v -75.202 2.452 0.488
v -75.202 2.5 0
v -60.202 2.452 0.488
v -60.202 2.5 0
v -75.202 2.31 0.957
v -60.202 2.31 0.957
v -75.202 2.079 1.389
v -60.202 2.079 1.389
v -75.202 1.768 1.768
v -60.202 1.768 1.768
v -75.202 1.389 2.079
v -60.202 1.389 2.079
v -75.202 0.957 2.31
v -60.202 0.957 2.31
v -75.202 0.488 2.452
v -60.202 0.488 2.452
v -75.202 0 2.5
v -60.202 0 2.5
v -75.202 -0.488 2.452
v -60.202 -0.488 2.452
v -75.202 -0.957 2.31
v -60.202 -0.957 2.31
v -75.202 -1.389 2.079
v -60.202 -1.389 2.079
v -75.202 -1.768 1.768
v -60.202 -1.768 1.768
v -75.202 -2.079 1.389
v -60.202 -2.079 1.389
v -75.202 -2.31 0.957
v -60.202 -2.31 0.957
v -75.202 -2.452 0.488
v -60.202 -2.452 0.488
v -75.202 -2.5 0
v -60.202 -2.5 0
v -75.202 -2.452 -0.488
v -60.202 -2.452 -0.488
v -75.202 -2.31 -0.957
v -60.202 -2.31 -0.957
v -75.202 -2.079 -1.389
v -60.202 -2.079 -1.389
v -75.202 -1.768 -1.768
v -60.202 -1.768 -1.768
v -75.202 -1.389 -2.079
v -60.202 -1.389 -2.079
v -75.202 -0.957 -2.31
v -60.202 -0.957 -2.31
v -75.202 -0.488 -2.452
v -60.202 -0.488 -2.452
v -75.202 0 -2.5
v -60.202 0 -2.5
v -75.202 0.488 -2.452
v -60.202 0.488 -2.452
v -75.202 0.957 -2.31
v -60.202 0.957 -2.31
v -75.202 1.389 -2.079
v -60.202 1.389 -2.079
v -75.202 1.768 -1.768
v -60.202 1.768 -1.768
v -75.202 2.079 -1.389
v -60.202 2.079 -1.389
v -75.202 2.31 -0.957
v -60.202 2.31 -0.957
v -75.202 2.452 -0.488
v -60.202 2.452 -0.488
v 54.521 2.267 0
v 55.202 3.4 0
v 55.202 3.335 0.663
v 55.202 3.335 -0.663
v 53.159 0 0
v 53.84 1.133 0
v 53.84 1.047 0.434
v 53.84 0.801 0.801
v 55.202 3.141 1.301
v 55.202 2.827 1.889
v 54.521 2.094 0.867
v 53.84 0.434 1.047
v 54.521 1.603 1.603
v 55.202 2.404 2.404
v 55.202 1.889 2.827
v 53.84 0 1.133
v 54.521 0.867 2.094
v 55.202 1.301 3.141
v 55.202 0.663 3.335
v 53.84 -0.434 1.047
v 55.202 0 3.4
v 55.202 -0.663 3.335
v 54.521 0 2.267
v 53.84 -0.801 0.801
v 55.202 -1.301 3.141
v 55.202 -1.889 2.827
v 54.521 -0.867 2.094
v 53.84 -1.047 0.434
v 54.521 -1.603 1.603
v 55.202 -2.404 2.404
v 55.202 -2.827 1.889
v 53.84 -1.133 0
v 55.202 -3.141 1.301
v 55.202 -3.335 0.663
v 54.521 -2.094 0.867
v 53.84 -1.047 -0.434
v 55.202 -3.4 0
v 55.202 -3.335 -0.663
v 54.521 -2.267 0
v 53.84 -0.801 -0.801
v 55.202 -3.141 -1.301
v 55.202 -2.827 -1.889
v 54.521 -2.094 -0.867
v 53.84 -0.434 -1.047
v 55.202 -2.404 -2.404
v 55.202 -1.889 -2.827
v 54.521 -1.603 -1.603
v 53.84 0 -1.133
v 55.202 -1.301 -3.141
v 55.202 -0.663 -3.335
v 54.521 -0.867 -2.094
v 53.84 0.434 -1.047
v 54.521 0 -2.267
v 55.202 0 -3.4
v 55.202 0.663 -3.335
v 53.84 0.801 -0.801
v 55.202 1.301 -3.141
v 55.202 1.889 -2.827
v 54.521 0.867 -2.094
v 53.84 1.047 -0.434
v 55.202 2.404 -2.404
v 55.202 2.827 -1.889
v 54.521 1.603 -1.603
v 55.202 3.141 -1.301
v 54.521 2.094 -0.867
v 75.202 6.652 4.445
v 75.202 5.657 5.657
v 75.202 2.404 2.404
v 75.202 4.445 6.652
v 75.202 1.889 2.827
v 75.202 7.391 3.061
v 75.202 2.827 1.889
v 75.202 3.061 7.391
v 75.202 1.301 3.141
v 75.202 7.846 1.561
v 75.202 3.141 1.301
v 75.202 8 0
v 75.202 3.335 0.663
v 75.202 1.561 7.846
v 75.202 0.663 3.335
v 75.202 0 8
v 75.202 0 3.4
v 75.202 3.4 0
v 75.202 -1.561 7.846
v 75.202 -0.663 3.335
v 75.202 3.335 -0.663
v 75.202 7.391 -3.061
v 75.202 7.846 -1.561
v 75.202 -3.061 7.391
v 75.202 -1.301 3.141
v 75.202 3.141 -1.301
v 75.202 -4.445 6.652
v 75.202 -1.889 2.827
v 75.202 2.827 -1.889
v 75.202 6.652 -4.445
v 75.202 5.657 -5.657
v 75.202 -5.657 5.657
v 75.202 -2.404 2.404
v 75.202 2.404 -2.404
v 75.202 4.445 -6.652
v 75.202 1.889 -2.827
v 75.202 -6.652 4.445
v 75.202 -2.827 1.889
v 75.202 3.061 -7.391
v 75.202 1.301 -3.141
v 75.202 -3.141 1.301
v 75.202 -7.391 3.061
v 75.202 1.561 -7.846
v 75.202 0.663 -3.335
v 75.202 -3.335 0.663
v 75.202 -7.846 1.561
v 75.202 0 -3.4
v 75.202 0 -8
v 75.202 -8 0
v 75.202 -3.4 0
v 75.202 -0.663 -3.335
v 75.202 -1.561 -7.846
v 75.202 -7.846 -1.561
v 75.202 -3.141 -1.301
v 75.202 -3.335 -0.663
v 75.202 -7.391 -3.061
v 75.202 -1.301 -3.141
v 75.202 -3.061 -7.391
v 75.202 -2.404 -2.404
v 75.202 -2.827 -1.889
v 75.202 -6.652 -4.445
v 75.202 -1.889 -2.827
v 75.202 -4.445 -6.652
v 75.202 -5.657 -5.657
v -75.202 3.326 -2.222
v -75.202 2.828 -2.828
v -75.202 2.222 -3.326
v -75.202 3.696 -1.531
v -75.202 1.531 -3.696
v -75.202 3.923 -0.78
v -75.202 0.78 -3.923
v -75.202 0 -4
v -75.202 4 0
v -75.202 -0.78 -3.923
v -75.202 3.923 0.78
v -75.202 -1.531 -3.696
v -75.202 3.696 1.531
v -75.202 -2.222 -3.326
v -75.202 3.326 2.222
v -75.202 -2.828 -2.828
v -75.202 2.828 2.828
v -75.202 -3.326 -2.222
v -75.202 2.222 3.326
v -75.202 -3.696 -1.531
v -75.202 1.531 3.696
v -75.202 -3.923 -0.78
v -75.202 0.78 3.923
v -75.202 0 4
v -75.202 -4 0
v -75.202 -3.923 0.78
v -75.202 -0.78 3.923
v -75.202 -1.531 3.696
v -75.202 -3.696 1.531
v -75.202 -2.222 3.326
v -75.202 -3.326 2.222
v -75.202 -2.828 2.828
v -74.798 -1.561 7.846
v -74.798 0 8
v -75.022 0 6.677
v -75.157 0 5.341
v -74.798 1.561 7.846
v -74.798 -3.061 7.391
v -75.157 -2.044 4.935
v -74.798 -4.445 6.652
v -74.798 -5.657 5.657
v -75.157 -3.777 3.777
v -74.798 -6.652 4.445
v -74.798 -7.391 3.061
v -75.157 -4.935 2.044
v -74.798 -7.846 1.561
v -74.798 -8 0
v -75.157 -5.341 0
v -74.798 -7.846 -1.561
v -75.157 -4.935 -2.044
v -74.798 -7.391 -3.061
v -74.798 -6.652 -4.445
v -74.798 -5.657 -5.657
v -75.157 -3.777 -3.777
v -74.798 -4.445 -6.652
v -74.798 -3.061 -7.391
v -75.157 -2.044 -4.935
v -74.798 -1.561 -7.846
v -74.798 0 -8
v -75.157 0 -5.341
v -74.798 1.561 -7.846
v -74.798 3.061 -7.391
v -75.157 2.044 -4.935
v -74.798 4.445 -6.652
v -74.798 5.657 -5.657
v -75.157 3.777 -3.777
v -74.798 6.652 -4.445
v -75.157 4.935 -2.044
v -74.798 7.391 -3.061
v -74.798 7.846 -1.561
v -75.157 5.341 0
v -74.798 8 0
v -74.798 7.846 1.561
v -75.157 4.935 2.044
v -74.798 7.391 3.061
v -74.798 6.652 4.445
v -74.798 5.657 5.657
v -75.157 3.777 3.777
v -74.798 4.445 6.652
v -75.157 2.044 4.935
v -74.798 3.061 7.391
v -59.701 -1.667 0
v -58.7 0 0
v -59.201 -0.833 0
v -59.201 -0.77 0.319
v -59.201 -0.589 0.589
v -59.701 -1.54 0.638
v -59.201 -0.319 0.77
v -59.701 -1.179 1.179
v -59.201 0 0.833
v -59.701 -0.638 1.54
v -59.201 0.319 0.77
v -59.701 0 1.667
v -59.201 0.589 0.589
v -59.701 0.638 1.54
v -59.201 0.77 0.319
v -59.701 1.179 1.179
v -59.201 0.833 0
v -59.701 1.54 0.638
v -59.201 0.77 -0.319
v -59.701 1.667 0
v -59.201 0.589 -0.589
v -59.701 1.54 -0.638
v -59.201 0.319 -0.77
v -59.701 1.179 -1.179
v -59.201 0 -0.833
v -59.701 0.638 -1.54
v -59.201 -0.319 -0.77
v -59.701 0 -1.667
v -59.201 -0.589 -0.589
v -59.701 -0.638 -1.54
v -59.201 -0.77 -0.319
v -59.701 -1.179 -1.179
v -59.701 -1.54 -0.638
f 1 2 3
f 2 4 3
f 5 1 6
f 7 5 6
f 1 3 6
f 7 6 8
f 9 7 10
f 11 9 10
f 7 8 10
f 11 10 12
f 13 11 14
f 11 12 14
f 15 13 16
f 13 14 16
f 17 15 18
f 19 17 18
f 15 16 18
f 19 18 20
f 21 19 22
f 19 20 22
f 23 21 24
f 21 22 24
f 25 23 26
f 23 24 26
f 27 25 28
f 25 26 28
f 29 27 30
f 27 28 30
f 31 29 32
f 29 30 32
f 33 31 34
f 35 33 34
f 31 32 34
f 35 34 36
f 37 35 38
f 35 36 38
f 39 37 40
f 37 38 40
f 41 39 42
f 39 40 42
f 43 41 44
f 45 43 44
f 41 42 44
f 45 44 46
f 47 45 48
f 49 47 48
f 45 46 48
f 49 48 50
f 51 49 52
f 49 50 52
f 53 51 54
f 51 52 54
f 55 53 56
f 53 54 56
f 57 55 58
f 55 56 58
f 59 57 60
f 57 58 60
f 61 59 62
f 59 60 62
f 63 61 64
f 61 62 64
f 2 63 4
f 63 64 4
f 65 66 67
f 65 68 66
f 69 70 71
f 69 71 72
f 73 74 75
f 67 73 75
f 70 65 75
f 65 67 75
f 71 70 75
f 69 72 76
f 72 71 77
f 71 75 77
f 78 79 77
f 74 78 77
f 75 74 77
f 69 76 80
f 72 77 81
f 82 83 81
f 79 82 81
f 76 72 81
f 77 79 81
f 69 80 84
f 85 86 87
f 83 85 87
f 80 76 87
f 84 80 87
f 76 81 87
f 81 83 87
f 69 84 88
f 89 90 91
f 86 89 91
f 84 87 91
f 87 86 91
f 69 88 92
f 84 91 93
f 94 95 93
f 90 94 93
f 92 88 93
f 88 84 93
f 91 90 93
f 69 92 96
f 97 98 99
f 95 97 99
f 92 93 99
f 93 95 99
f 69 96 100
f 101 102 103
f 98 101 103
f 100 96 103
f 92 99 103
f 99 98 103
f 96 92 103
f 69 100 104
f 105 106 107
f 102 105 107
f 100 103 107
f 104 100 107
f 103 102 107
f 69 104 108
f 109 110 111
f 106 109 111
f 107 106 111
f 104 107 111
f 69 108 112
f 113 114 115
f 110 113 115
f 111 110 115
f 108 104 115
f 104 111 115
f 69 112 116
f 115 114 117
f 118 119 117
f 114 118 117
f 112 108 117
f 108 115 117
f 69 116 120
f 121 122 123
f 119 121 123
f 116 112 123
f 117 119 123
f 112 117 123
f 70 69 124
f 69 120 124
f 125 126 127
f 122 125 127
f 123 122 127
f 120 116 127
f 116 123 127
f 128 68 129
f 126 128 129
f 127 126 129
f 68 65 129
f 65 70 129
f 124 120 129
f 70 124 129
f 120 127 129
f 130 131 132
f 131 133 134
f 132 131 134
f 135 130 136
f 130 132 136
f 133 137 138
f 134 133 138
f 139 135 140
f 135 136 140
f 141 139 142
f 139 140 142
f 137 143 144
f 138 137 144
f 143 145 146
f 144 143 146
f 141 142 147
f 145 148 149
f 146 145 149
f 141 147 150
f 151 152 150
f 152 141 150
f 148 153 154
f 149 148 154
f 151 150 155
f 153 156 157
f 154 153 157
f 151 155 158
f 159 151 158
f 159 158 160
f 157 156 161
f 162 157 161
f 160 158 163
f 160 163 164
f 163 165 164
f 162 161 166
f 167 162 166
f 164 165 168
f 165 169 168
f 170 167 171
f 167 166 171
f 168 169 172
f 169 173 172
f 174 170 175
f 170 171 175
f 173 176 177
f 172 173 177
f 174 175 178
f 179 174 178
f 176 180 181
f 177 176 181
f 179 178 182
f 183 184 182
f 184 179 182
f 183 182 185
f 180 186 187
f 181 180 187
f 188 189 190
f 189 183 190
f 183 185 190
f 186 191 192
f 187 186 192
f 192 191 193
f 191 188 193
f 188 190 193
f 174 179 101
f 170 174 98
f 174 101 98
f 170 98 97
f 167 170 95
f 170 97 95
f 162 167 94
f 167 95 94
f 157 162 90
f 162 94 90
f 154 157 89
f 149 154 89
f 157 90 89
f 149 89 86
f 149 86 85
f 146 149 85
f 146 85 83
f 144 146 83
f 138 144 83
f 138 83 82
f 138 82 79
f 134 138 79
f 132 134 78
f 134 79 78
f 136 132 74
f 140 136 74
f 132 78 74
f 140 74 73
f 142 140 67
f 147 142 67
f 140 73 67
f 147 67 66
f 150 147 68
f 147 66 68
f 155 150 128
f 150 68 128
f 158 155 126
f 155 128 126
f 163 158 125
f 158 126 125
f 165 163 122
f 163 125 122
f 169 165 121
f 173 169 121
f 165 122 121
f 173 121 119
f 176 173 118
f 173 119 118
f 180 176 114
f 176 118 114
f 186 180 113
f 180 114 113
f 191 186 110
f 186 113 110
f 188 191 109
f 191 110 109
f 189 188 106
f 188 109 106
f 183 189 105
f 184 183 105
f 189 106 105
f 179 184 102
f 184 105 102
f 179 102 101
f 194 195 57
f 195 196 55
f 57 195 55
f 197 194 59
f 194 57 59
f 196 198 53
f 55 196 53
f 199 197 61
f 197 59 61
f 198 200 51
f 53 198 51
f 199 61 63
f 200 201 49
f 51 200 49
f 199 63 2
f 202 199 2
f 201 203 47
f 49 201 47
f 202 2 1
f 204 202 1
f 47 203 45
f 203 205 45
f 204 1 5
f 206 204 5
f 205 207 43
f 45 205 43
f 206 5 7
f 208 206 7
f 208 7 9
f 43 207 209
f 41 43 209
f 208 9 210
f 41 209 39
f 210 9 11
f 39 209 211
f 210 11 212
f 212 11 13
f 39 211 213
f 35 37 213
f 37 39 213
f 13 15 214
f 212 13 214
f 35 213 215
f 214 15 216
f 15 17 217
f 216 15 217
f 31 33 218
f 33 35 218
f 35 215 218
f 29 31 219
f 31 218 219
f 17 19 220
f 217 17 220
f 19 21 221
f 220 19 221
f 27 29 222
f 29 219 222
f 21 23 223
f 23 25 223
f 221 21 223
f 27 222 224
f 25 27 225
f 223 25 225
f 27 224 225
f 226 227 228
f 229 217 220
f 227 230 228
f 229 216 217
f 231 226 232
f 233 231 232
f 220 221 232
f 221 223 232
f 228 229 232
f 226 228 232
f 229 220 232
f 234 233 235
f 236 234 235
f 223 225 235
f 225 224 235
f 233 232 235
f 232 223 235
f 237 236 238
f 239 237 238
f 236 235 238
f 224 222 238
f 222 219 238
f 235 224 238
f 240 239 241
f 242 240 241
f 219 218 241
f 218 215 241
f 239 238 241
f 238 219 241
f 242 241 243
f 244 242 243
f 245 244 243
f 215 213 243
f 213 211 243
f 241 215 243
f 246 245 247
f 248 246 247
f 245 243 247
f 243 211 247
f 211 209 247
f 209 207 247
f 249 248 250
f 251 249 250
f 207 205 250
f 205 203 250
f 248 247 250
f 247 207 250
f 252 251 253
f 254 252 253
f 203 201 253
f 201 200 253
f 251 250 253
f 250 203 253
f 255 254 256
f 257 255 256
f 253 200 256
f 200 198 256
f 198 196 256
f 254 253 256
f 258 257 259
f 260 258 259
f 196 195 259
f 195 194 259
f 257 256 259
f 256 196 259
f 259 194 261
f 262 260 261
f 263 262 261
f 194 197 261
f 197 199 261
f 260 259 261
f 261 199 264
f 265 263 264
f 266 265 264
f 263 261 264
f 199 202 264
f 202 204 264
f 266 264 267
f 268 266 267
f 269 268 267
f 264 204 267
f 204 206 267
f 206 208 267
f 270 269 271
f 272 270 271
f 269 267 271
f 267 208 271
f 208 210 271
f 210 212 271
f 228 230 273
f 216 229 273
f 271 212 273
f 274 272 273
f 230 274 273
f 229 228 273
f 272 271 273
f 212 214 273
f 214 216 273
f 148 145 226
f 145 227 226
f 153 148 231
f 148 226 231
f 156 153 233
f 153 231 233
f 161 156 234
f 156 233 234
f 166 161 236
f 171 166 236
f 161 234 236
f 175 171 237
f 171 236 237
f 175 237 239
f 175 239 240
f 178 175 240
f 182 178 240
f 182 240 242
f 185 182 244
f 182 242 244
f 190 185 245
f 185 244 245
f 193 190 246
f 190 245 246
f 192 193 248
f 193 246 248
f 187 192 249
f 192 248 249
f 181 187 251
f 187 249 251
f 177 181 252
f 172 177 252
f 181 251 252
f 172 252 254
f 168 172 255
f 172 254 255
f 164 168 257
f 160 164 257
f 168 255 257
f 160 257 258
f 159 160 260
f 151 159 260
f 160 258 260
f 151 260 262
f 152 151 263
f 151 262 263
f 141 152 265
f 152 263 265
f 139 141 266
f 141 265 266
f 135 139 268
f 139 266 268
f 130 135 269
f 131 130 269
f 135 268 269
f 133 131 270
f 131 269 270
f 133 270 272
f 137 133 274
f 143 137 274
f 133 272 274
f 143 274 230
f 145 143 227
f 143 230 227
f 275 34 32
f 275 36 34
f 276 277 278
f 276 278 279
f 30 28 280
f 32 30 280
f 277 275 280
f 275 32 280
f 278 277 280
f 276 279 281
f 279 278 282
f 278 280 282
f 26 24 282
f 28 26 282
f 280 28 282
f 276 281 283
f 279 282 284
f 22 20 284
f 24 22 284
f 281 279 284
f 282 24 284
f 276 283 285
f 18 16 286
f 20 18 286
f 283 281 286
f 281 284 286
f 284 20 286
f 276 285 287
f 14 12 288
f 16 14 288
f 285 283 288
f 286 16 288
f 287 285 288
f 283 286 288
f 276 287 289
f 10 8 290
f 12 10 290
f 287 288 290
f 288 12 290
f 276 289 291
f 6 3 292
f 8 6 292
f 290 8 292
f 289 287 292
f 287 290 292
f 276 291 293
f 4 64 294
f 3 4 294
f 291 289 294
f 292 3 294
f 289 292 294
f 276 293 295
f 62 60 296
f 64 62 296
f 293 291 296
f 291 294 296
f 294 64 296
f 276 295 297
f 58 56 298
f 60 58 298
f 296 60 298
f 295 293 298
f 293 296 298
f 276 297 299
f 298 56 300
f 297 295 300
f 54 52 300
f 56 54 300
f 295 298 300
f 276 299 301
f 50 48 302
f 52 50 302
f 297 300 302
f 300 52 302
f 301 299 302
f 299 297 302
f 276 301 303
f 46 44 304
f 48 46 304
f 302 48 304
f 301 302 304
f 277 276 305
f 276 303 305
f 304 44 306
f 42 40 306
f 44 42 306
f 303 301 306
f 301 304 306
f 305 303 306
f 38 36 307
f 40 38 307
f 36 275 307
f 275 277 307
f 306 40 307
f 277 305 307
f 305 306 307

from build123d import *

# Parameters (mm, degrees)
F3_D     = 5
F3_DEPTH = 15
F3_TIP   = 1.5021515476
F5_D     = 6.8
F5_DEPTH = 20
F5_TIP   = 2.0429261047


with BuildPart() as f1:
    # F0 (on Front) → F1 (revolve)
    with BuildSketch(Plane.XZ):
        with BuildLine():
            Line((-75.2020410289, 0), (75.2020410289, 0))
            Line((75.2020410289, 0), (75.2020410289, 8))
            Line((75.2020410289, 8), (-74.7979589711, 8))
            ThreePointArc((-74.7979589711, 8), (-75.100764089, 6.0101792401), (-75.2020410289, 4))
            Line((-75.2020410289, 4), (-75.2020410289, 0))
        make_face()
    revolve(axis=Axis((-20.4167328775, 0, 0), (1, 0, 0)))

    # F3
    with Locations(Plane(origin=(-75.2020410289, 0, 0), x_dir=(0, -1, 0), z_dir=(-1, 0, 0))):
        with Locations((0, 0)):
            Hole(F3_D / 2, depth=F3_DEPTH)
            with Locations((0, 0, -(F3_DEPTH + F3_TIP / 2))):  # 118° drill point
                Cone(0, F3_D / 2, F3_TIP, mode=Mode.SUBTRACT)

    # F5
    with Locations(Plane.YZ.offset(75.2020410289)):
        with Locations((0, 0)):
            Hole(F5_D / 2, depth=F5_DEPTH)
            with Locations((0, 0, -(F5_DEPTH + F5_TIP / 2))):  # 118° drill point
                Cone(0, F5_D / 2, F5_TIP, mode=Mode.SUBTRACT)


solid = f1.part
